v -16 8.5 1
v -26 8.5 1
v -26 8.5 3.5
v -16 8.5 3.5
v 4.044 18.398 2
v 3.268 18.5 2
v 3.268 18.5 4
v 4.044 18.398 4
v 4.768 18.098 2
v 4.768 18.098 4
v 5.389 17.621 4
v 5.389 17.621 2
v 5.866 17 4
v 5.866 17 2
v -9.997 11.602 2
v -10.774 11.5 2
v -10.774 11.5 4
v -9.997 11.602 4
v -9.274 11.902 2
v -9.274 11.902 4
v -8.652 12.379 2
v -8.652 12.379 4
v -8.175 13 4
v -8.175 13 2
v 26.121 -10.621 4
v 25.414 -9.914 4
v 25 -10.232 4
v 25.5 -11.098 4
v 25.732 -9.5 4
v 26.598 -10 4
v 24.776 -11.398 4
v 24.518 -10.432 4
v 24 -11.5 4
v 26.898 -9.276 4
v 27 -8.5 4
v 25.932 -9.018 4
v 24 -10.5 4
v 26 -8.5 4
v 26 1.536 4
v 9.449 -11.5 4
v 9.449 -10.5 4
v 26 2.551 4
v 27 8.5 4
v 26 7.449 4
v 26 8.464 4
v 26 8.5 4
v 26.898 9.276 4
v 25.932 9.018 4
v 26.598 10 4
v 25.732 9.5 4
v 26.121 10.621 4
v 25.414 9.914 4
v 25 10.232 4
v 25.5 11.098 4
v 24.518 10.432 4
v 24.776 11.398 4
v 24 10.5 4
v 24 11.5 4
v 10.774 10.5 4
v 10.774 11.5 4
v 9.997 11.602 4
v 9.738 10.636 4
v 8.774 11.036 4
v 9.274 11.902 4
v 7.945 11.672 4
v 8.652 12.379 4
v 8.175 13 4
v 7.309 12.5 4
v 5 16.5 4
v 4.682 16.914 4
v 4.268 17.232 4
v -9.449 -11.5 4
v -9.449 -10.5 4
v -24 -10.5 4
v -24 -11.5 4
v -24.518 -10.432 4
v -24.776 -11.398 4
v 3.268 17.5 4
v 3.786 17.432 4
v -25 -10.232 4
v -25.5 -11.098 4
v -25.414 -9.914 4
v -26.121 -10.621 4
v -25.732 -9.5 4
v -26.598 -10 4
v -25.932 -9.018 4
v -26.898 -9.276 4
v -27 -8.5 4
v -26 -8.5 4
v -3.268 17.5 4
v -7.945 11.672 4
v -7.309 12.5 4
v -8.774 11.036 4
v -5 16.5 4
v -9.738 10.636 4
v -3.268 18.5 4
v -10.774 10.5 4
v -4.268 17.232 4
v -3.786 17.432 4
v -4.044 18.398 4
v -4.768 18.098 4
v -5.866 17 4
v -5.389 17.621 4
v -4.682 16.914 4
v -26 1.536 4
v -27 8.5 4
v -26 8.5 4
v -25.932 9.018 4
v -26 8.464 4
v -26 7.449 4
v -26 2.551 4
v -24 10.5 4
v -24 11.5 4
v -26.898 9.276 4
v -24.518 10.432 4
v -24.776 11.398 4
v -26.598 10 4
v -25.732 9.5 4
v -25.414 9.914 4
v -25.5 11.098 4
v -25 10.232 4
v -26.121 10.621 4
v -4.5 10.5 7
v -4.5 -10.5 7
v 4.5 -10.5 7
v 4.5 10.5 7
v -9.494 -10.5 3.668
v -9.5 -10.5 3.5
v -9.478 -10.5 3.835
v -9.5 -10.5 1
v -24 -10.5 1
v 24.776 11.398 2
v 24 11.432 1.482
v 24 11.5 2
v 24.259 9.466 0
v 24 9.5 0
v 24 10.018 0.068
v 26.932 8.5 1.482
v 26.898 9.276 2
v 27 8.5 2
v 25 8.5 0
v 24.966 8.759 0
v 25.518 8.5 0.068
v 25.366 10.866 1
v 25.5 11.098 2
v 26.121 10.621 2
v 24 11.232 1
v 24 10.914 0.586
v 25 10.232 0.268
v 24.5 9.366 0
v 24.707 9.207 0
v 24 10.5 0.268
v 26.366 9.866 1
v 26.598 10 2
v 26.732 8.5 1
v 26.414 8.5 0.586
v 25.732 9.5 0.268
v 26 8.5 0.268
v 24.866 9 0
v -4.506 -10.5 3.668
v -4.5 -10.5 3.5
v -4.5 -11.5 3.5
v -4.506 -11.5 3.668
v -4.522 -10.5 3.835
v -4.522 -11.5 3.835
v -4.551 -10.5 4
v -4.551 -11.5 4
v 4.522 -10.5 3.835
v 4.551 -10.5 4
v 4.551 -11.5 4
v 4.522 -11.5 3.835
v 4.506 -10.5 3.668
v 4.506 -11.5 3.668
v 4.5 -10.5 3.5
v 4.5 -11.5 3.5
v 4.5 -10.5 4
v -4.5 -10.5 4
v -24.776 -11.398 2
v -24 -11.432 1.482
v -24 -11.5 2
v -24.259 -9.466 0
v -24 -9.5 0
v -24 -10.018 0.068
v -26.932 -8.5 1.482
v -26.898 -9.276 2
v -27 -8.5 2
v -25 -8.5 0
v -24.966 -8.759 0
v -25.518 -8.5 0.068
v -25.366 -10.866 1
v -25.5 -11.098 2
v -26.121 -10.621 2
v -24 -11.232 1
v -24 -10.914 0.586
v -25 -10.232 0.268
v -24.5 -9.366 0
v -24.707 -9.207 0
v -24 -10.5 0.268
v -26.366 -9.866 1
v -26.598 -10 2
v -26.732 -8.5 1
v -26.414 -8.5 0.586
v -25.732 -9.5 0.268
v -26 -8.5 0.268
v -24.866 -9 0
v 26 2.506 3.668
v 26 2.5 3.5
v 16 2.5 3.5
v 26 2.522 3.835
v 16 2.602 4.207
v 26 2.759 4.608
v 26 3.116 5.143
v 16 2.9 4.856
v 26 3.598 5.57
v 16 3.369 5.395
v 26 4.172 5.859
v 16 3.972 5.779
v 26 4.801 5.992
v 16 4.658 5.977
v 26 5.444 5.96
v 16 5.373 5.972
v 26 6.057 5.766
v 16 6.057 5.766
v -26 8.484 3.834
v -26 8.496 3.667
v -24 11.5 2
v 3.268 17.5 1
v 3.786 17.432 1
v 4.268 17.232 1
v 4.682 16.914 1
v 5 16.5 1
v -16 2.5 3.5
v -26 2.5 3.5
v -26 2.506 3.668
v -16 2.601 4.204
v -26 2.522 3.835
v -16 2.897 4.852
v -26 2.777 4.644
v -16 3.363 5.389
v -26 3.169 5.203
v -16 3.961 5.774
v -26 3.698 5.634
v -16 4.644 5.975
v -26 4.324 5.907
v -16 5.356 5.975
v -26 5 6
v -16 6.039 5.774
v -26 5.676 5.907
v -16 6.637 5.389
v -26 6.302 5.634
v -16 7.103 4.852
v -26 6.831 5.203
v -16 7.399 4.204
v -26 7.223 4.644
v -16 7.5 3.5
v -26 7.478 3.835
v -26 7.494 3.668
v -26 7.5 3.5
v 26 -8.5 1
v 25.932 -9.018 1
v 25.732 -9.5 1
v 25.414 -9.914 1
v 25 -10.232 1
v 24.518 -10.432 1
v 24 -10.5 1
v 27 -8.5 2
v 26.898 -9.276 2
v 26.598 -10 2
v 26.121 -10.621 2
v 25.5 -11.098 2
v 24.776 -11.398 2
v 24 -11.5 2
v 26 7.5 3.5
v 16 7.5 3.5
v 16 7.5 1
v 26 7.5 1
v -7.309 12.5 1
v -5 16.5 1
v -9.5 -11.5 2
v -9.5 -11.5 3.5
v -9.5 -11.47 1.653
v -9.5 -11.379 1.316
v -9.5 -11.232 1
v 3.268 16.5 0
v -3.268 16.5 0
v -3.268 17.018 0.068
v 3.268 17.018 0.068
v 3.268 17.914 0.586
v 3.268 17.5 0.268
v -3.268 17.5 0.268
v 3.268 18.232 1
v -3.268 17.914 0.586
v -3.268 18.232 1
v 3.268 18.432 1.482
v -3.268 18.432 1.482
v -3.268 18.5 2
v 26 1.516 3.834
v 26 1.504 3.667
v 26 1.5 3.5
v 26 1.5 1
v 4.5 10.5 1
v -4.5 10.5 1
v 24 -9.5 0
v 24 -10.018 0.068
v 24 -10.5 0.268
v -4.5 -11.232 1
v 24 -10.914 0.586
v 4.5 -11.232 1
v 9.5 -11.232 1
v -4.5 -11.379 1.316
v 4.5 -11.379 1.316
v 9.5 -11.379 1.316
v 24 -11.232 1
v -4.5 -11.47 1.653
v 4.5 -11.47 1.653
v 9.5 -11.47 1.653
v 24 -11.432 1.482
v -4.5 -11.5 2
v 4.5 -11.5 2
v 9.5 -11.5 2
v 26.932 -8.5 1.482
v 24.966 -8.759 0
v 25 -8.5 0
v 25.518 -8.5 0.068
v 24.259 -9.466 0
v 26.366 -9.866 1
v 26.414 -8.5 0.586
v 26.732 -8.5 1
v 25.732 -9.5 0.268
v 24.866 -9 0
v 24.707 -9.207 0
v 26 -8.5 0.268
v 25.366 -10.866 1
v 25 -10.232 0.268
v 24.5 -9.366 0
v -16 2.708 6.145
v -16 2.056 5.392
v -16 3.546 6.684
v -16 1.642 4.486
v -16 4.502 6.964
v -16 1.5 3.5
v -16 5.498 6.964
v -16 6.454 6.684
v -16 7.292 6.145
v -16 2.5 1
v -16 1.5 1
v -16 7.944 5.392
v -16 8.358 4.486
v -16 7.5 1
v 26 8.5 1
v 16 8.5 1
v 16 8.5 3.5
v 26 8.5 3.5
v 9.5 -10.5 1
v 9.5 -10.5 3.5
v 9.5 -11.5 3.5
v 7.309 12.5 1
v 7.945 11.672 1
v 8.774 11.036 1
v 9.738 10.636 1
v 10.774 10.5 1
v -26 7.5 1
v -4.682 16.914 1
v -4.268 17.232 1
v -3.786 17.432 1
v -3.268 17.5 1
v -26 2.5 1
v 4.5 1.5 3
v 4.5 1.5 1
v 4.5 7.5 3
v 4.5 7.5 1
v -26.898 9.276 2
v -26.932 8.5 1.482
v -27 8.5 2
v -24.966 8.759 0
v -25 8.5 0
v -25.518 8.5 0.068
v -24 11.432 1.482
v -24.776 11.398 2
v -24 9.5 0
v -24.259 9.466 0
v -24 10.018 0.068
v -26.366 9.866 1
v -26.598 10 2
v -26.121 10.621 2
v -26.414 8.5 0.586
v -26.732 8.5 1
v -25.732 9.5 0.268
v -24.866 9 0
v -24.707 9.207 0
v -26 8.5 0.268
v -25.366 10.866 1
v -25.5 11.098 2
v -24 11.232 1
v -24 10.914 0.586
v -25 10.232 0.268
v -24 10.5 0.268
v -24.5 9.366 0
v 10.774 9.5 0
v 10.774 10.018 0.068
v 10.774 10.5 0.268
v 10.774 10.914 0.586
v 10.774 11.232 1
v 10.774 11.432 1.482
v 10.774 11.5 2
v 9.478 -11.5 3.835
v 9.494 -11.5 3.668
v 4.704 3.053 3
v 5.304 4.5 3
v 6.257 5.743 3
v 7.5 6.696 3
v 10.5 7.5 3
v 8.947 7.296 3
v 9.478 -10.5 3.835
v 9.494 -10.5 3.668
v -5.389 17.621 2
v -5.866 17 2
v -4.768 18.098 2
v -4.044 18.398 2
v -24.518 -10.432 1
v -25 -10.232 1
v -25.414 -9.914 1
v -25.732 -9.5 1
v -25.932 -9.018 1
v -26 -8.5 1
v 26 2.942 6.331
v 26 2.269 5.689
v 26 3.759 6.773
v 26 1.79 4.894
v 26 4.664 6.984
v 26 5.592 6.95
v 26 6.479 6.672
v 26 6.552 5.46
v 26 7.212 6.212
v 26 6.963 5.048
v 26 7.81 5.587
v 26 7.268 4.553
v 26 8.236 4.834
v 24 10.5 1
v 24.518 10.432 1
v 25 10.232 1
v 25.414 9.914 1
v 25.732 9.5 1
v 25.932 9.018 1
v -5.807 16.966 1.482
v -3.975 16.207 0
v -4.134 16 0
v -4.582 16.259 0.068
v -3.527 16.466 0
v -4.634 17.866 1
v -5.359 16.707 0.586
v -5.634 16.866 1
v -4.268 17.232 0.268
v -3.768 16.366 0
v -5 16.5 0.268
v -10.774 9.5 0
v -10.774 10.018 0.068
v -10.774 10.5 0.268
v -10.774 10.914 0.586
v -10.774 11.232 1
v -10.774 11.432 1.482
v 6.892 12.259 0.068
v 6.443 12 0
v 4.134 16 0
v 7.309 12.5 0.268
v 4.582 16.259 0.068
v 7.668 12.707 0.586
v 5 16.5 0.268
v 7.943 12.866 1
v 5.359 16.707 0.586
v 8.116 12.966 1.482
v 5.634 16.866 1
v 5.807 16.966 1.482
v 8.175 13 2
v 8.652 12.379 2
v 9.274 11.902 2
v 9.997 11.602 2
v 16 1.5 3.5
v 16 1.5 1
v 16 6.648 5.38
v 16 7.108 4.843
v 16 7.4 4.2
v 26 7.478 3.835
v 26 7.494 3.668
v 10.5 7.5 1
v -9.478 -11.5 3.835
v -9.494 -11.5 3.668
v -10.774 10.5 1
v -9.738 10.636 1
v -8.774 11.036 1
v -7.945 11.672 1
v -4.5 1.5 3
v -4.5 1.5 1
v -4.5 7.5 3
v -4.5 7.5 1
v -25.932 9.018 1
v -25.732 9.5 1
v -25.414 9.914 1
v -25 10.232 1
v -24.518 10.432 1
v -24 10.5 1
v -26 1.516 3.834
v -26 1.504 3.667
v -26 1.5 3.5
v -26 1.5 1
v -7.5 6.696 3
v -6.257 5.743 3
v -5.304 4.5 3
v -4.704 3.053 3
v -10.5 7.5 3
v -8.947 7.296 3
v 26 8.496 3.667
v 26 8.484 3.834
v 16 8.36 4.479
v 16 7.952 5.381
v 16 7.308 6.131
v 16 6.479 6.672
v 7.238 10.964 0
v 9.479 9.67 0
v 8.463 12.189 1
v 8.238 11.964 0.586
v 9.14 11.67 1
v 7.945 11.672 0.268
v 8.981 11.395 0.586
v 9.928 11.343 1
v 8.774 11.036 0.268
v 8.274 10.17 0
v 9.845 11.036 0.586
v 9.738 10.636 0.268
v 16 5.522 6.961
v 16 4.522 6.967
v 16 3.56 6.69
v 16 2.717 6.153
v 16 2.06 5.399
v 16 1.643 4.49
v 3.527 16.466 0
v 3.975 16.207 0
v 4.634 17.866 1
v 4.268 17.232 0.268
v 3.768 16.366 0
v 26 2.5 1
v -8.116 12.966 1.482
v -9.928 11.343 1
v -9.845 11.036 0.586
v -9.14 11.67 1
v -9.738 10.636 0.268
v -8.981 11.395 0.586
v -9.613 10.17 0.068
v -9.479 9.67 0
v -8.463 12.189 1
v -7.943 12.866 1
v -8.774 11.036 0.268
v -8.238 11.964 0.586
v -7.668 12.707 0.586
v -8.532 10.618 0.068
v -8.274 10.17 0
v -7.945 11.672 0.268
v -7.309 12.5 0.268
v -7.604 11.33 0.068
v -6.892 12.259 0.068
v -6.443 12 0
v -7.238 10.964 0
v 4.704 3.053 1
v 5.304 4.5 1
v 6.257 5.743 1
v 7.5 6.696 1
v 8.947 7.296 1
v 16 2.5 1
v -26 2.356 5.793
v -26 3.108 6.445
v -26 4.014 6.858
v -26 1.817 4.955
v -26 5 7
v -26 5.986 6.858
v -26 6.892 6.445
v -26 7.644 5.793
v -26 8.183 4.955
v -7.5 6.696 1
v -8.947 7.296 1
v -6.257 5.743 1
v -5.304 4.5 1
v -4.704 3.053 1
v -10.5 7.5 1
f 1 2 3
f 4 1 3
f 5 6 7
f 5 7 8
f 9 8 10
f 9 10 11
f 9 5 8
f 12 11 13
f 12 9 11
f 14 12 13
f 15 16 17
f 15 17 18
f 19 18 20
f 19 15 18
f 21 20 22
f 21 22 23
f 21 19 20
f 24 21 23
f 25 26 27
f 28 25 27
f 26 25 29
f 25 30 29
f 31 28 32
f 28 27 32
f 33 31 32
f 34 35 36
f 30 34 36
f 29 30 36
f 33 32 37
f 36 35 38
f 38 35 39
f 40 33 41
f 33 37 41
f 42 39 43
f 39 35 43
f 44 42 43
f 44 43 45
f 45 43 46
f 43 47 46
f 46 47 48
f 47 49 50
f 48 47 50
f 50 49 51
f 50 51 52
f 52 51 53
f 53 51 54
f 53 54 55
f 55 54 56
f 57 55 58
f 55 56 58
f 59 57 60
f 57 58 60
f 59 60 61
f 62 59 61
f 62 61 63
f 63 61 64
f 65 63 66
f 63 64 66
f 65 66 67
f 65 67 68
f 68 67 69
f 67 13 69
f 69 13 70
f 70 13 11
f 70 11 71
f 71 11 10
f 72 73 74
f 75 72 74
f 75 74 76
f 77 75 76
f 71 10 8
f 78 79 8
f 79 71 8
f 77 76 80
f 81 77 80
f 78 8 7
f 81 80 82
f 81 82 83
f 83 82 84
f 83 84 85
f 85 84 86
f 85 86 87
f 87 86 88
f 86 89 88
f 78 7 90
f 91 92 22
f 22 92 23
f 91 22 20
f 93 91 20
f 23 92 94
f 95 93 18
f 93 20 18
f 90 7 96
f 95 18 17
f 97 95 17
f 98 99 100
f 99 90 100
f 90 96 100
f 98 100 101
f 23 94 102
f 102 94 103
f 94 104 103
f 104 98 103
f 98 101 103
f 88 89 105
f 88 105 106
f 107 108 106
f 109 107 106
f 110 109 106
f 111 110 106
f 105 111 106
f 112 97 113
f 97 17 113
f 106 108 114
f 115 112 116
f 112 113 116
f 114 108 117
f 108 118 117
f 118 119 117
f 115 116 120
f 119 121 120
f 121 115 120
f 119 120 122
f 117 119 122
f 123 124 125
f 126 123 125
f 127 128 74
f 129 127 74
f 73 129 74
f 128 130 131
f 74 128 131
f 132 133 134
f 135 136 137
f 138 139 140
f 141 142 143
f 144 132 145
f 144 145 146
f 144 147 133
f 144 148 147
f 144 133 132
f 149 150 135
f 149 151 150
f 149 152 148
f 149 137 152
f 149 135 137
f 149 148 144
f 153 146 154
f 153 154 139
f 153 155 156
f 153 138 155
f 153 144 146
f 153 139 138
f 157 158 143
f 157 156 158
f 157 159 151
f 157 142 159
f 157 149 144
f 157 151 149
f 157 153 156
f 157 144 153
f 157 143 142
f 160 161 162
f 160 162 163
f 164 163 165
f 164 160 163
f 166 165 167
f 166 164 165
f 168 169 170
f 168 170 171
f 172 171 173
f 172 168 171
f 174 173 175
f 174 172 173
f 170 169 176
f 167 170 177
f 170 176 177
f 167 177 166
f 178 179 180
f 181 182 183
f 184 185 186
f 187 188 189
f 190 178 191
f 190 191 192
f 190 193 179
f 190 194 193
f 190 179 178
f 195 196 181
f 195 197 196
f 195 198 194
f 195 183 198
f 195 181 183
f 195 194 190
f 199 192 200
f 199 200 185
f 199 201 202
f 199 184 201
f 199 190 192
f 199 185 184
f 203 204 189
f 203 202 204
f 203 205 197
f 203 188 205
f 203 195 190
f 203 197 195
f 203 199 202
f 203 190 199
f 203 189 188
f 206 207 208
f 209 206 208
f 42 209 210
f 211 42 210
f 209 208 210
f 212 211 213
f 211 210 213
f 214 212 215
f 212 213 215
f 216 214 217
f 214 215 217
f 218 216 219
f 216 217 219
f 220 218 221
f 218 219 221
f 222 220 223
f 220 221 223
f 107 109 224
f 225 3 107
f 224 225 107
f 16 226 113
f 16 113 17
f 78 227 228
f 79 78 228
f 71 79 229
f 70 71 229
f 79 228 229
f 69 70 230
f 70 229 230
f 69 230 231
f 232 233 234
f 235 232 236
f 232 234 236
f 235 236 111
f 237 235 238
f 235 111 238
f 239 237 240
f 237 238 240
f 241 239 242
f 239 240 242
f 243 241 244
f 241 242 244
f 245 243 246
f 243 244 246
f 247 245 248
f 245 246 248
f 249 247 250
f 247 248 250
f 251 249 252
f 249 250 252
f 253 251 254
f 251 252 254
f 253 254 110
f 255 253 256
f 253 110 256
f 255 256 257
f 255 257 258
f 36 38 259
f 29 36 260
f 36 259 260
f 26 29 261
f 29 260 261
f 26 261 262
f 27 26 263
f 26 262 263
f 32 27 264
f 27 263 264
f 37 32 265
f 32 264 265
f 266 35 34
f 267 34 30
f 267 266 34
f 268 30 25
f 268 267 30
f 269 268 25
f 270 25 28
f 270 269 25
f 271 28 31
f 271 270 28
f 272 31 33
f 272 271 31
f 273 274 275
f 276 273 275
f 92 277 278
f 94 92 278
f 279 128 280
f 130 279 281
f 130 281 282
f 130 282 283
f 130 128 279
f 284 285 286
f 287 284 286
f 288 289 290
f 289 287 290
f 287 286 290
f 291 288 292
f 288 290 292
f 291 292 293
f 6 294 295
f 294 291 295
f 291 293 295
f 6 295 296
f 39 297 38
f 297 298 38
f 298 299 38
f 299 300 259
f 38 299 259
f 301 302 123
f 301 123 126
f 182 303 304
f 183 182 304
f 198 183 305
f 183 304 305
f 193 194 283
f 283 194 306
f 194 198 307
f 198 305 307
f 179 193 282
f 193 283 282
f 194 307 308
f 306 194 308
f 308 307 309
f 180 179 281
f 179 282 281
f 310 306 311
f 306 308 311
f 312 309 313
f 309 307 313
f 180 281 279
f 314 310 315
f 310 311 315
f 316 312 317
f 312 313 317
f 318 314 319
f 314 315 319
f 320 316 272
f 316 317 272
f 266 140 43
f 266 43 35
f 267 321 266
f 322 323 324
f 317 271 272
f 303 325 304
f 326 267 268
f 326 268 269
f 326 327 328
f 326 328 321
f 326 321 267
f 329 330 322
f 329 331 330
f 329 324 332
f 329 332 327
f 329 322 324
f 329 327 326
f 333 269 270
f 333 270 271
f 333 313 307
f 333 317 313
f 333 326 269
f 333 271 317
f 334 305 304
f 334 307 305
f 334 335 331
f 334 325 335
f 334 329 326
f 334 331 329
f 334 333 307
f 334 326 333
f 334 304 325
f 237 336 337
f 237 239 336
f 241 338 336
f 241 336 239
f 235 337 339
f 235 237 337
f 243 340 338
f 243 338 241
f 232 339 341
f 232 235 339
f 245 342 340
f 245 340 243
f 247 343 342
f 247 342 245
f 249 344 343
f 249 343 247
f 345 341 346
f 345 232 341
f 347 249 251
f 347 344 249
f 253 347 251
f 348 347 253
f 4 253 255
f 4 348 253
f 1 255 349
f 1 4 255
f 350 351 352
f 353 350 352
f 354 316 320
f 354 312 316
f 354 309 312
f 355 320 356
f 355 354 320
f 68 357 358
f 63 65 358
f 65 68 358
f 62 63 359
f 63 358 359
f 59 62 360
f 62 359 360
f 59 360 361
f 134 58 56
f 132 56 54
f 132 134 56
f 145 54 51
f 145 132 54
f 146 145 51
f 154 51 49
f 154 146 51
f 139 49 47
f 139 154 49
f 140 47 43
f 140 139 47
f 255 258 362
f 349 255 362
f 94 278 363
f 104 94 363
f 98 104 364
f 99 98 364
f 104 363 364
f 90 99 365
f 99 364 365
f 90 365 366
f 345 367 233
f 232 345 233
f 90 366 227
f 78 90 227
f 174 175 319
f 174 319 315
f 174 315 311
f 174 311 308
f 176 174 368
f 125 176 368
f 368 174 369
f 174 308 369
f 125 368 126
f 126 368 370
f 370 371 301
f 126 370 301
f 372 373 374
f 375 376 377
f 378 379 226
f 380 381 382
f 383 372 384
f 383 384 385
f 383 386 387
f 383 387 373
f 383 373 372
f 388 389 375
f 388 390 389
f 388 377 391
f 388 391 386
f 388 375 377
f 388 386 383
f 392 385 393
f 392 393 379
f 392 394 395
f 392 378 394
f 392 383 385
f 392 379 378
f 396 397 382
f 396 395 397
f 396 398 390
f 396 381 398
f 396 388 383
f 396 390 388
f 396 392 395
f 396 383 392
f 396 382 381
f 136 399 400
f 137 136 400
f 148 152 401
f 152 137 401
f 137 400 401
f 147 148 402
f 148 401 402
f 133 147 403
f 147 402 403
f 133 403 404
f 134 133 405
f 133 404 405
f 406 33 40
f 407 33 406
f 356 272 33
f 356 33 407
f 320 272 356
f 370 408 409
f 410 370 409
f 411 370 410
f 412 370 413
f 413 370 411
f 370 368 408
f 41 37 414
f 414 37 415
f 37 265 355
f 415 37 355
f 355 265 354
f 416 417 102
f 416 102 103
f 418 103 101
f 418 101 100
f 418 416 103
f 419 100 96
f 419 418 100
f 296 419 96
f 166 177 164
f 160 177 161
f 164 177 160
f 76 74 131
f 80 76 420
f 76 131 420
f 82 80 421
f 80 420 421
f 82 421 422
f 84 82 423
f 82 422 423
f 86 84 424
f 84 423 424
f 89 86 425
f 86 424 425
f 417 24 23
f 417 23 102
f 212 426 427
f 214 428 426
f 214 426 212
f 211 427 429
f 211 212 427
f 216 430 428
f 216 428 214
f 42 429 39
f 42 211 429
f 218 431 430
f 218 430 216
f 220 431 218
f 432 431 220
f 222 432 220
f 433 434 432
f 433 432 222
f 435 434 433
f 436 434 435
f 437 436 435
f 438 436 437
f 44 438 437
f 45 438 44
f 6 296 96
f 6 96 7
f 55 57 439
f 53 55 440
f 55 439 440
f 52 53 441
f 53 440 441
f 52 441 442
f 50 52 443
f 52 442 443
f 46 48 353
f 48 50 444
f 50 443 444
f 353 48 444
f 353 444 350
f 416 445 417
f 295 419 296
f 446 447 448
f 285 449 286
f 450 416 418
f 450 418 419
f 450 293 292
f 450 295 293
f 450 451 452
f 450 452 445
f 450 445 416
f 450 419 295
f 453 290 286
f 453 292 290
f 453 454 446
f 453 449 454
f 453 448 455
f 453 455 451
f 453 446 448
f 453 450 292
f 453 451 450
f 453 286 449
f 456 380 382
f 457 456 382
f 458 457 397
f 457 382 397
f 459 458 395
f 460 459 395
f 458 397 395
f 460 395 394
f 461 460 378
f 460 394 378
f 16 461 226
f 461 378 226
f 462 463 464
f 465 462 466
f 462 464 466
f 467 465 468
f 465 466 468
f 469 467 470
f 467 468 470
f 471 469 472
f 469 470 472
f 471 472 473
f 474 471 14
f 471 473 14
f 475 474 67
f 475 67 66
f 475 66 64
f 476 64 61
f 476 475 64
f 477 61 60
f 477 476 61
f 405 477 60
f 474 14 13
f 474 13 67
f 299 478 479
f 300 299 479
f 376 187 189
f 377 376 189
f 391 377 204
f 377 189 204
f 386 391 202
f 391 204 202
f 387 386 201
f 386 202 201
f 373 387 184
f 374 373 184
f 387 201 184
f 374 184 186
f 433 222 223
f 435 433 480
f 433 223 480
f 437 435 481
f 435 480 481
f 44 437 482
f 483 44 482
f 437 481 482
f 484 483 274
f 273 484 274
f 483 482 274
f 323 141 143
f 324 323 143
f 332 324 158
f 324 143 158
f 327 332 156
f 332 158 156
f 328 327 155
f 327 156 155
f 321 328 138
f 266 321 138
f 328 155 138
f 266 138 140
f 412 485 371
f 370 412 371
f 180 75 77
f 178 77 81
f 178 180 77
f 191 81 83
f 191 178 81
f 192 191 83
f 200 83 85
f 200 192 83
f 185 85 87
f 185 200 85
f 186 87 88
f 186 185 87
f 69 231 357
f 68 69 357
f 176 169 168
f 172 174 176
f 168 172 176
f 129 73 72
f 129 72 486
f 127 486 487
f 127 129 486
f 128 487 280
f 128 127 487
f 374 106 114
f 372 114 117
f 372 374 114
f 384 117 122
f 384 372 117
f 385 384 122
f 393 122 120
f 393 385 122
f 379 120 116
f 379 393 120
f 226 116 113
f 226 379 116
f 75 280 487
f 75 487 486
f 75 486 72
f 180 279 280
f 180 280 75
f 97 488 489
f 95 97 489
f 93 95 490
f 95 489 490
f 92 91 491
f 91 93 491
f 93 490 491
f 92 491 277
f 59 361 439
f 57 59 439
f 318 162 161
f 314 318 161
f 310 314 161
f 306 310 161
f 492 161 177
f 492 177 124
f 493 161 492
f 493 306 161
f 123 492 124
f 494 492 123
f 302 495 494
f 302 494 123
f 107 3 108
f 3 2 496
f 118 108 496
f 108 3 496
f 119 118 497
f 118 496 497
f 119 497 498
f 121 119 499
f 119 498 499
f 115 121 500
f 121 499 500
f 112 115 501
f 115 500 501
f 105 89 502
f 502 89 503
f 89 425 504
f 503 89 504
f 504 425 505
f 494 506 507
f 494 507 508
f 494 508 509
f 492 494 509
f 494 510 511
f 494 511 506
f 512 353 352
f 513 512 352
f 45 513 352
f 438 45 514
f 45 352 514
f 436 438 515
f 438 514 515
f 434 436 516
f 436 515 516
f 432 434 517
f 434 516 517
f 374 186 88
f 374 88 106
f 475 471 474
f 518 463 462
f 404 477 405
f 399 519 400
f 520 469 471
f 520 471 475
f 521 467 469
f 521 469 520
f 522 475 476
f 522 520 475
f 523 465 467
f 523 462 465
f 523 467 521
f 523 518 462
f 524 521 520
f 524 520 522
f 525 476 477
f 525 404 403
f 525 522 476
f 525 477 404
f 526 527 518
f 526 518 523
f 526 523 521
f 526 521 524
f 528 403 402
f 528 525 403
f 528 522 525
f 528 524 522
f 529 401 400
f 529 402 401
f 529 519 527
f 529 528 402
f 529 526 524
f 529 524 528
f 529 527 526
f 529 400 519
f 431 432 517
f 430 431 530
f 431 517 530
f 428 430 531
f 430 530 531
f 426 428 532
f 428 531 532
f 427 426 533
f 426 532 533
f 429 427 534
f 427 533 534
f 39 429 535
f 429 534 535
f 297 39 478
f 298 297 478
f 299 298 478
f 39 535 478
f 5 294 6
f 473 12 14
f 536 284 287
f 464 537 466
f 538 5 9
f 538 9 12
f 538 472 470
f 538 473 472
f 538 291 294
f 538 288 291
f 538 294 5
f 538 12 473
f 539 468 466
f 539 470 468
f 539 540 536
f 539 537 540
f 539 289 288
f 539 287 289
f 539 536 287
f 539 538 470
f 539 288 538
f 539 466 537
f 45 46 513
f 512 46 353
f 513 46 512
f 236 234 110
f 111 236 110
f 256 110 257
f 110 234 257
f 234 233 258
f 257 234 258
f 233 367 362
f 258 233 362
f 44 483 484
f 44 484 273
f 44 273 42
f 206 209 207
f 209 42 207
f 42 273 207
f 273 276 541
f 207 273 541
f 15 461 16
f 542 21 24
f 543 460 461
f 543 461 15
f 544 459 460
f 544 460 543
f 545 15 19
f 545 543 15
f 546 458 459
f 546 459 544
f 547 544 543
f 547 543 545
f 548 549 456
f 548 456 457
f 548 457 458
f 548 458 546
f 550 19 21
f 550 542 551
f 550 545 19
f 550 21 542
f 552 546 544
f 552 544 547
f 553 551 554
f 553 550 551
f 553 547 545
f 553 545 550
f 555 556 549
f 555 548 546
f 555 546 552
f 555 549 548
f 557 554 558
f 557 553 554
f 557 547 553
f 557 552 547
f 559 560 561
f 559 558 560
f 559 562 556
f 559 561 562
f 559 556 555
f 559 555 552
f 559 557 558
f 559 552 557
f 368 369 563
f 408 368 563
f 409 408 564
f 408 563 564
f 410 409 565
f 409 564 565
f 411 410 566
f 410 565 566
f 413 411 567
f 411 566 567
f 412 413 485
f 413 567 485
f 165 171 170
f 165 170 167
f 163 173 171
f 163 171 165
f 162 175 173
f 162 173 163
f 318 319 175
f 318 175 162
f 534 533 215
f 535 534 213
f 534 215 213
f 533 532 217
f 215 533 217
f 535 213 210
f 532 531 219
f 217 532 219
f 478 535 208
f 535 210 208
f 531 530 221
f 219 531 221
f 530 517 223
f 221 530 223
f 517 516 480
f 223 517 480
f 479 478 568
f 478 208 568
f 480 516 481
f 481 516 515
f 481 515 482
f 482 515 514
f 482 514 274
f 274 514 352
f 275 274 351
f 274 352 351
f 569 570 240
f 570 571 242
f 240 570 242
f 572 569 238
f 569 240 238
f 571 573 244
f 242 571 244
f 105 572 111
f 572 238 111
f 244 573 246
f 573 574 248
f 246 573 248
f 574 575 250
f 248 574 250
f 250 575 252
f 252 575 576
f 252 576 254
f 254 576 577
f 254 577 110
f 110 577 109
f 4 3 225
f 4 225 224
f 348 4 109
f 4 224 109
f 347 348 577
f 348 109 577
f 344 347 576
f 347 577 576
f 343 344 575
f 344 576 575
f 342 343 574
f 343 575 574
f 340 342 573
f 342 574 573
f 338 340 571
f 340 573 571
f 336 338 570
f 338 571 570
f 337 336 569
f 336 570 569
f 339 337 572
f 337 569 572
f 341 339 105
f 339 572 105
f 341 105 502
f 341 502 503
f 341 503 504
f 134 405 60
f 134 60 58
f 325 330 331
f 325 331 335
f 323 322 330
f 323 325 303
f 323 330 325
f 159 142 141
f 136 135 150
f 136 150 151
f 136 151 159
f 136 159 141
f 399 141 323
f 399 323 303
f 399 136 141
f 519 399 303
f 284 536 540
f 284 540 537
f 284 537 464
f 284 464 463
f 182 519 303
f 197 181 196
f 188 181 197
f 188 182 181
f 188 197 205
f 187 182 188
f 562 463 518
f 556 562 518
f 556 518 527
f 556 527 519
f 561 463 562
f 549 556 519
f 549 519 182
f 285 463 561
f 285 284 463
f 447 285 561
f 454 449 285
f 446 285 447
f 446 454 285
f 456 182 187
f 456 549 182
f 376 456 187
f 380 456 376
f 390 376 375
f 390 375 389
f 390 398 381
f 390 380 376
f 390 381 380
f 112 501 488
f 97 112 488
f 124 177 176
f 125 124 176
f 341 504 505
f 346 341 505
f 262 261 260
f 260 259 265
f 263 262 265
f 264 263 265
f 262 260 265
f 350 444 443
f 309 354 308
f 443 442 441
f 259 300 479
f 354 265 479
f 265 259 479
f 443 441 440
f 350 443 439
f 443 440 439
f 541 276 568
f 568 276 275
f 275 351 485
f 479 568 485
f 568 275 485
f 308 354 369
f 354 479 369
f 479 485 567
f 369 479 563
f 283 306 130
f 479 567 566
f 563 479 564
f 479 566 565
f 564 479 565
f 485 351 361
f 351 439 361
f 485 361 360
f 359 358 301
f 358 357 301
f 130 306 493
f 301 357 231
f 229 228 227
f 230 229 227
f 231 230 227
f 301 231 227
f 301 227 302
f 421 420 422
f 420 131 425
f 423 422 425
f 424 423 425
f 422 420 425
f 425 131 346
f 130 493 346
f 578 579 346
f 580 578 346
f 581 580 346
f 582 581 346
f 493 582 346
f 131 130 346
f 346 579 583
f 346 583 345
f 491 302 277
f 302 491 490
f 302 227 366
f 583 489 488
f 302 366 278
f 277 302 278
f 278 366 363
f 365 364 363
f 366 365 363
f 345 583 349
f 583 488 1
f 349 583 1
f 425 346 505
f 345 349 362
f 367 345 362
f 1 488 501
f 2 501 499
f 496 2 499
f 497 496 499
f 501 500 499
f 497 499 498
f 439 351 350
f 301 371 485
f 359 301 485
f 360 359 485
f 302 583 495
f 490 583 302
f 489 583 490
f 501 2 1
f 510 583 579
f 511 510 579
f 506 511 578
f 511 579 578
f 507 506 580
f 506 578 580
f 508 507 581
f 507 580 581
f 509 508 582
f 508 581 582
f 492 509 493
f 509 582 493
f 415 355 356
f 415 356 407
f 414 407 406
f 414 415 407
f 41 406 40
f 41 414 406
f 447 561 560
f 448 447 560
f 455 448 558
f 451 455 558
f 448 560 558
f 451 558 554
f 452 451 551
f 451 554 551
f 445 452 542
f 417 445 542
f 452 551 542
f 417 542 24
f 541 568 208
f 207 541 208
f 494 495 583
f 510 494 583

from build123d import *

# Parameters (mm, degrees)
BOSS_EXTRUDE1_DEPTH = 4
SHELL1_T            = -1
BOSS_EXTRUDE2_START = -26
BOSS_EXTRUDE2_DEPTH = 10
BOSS_EXTRUDE3_START = 16
BOSS_EXTRUDE3_DEPTH = 10
BOSS_EXTRUDE5_DEPTH = 2
SKETCH4_3_W         = 9
SKETCH4_3_H         = 21
BOSS_EXTRUDE6_DEPTH = 6
CUT_EXTRUDE1_REACH  = 35.47
FILLET1_R           = 2


with BuildPart() as part:
    # Sketch2 → Boss-Extrude1 (new body)
    with BuildSketch(Plane.XY):
        with BuildLine():
            Line((-3.267949192, 18.5), (3.267949192, 18.5))
            ThreePointArc((3.267949192, 18.5), (4.767949192, 18.098076211), (5.866025404, 17))
            Line((5.866025404, 17), (8.175426481, 13))
            ThreePointArc((8.175426481, 13), (9.273502692, 11.901923789), (10.773502692, 11.5))
            Line((10.773502692, 11.5), (24, 11.5))
            ThreePointArc((24, 11.5), (26.121320344, 10.621320344), (27, 8.5))
            Line((27, 8.5), (27, -8.5))
            ThreePointArc((27, -8.5), (26.121320344, -10.621320344), (24, -11.5))
            Line((24, -11.5), (-24, -11.5))
            ThreePointArc((-24, -11.5), (-26.121320344, -10.621320344), (-27, -8.5))
            Line((-27, -8.5), (-27, 8.5))
            ThreePointArc((-27, 8.5), (-26.121320344, 10.621320344), (-24, 11.5))
            Line((-24, 11.5), (-10.773502692, 11.5))
            ThreePointArc((-10.773502692, 11.5), (-9.273502692, 11.901923789), (-8.175426481, 13))
            Line((-8.175426481, 13), (-5.866025404, 17))
            ThreePointArc((-5.866025404, 17), (-4.767949192, 18.098076211), (-3.267949192, 18.5))
        make_face()
    extrude(amount=BOSS_EXTRUDE1_DEPTH)

    # Shell1
    shell1_openings = [part.faces().sort_by_distance(p)[0] for p in [
        (0, 1.077008716, 4),
    ]]
    offset(amount=SHELL1_T, openings=shell1_openings, kind=Kind.INTERSECTION)

    # Sketch3 → Boss-Extrude2 (add)
    with BuildSketch(Plane(origin=(0, 0, 0), x_dir=(0, 0, -1), z_dir=(1, 0, 0)).offset(BOSS_EXTRUDE2_START)):
        with BuildLine():
            Line((-1, 2.5), (-3.5, 2.5))
            ThreePointArc((-3.5, 2.5), (-6, 5), (-3.5, 7.5))
            Line((-3.5, 7.5), (-1, 7.5))
            Line((-1, 7.5), (-1, 8.5))
            Line((-1, 8.5), (-3.5, 8.5))
            ThreePointArc((-3.5, 8.5), (-7, 5), (-3.5, 1.5))
            Line((-3.5, 1.5), (-1, 1.5))
            Line((-1, 1.5), (-1, 2.5))
        make_face()
    extrude(amount=BOSS_EXTRUDE2_DEPTH)

    # Sketch3<3> → Boss-Extrude3 (add)
    with BuildSketch(Plane(origin=(0, 0, 0), x_dir=(0, 0, -1), z_dir=(1, 0, 0)).offset(BOSS_EXTRUDE3_START)):
        with BuildLine():
            Line((-6.672077255, 6.479163916), (-5.765769468, 6.056545654))
            ThreePointArc((-5.765769468, 6.056545654), (-4.843249021, 7.108478615), (-3.5, 7.5))
            Line((-3.5, 7.5), (-1, 7.5))
            Line((-1, 7.5), (-1, 8.5))
            Line((-1, 8.5), (-3.5, 8.5))
            ThreePointArc((-3.5, 8.5), (-5.380548629, 7.95187006), (-6.672077255, 6.479163916))
        make_face()
        with BuildLine():
            Line((-1, 2.5), (-3.5, 2.5))
            ThreePointArc((-3.5, 2.5), (-5.608478615, 3.656750979), (-5.765769468, 6.056545654))
            Line((-5.765769468, 6.056545654), (-6.672077255, 6.479163916))
            ThreePointArc((-6.672077255, 6.479163916), (-6.45187006, 3.119451371), (-3.5, 1.5))
            Line((-3.5, 1.5), (-1, 1.5))
            Line((-1, 1.5), (-1, 2.5))
        make_face()
    extrude(amount=BOSS_EXTRUDE3_DEPTH)

    # Sketch4 → Boss-Extrude5 (add)
    with BuildSketch(Plane.XY.offset(1)):
        with BuildLine():
            Line((-4.5, 1.5), (-4.5, 7.5))
            Line((-4.5, 7.5), (-10.5, 7.5))
            ThreePointArc((-10.5, 7.5), (-6.257359313, 5.742640687), (-4.5, 1.5))
        make_face()
        with BuildLine():
            Line((10.5, 7.5), (4.5, 7.5))
            Line((4.5, 7.5), (4.5, 1.5))
            ThreePointArc((4.5, 1.5), (6.257359313, 5.742640687), (10.5, 7.5))
        make_face()
    extrude(amount=BOSS_EXTRUDE5_DEPTH)

    # Sketch4<3> → Boss-Extrude6 (add)
    with BuildSketch(Plane.XY.offset(1)):
        Rectangle(SKETCH4_3_W, SKETCH4_3_H)
    extrude(amount=BOSS_EXTRUDE6_DEPTH)

    # Sketch5 → Cut-Extrude1 (cut, up to next)
    with BuildSketch(Plane(origin=(0, 0, 0), x_dir=(1, 0, 0), z_dir=(0, 1, 0)), mode=Mode.PRIVATE) as cut_extrude1_sk1:
        with BuildLine():
            Line((-9.5, -3.5), (-9.5, -1))
            Line((-9.5, -1), (-4.5, -1))
            Line((-4.5, -1), (-4.5, -3.5))
            ThreePointArc((-4.5, -3.5), (-7, -6), (-9.5, -3.5))
        make_face()
    cut_extrude1_tool1 = extrude(cut_extrude1_sk1.sketch, amount=-CUT_EXTRUDE1_REACH, mode=Mode.PRIVATE) & part.part
    # Sketch5 → Cut-Extrude1 (cut, up to next)
    with BuildSketch(Plane(origin=(0, 0, 0), x_dir=(1, 0, 0), z_dir=(0, 1, 0)), mode=Mode.PRIVATE) as cut_extrude1_sk2:
        with BuildLine():
            Line((4.5, -3.5), (4.5, -1))
            Line((4.5, -1), (9.5, -1))
            Line((9.5, -1), (9.5, -3.5))
            ThreePointArc((9.5, -3.5), (7, -6), (4.5, -3.5))
        make_face()
    cut_extrude1_tool2 = extrude(cut_extrude1_sk2.sketch, amount=-CUT_EXTRUDE1_REACH, mode=Mode.PRIVATE) & part.part
    add(cut_extrude1_tool1.solids().sort_by_distance((-7, 0, 3.266625))[0], mode=Mode.SUBTRACT)
    add(cut_extrude1_tool2.solids().sort_by_distance((7, 0, 3.266625))[0], mode=Mode.SUBTRACT)

    # Fillet1
    # the kernel refuses this fillet: 2 mm, written as the material it takes off along each edge
    with BuildSketch(Plane(origin=(27, 8.5, 0), x_dir=(0, 0, 1), z_dir=(0, -1, 0)), Plane(origin=(-27, -8.5, 0), x_dir=(0, 0, 1), z_dir=(0, 1, 0))) as fillet1_piece_1:
        with BuildLine():
            CenterArc((FILLET1_R, FILLET1_R), FILLET1_R, 180, 90)
            Line((0, FILLET1_R), (0, 0))
            Line((0, 0), (FILLET1_R, 0))
        make_face()
    extrude(amount=17, mode=Mode.SUBTRACT)
    with BuildSketch(Plane(origin=(24, 8.5, 0), x_dir=(0, 1, 0), z_dir=(-1, 0, 0))) as fillet1_piece_2:
        with BuildLine():
            CenterArc((3 - FILLET1_R, -FILLET1_R), FILLET1_R, 0, 90)
            Line((3 - FILLET1_R, 0), (3, 0))
            Line((3, 0), (3, -FILLET1_R))
        make_face()
    revolve(axis=Axis((24, 8.5, 0), (0, 0, -1)), revolution_arc=90, mode=Mode.SUBTRACT)
    with BuildSketch(Plane(origin=(10.773502692, 11.5, 0), x_dir=(0, 0, 1), z_dir=(1, 0, 0)), Plane(origin=(-24, 11.5, 0), x_dir=(0, 0, 1), z_dir=(1, 0, 0))) as fillet1_piece_3:
        with BuildLine():
            CenterArc((FILLET1_R, FILLET1_R), FILLET1_R, 180, 90)
            Line((0, FILLET1_R), (0, 0))
            Line((0, 0), (FILLET1_R, 0))
        make_face()
    extrude(amount=13.226497308, mode=Mode.SUBTRACT)
    with BuildSketch(Plane(origin=(10.773502692, 14.5, 0), x_dir=(-0.8660254037844389, -0.49999999999999956, 0), z_dir=(-0.49999999999999956, 0.8660254037844389, 0))) as fillet1_piece_4:
        with BuildLine():
            CenterArc((3 + FILLET1_R, FILLET1_R), FILLET1_R, 180, 90)
            Line((3 + FILLET1_R, 0), (3, 0))
            Line((3, 0), (3, FILLET1_R))
        make_face()
    revolve(axis=Axis((10.773502692, 14.5, 0), (0, 0, 1)), revolution_arc=60, mode=Mode.SUBTRACT)
    with BuildSketch(Plane(origin=(5.866025404, 17, 0), x_dir=(0, 0, 1), z_dir=(0.500000000000004, -0.8660254037844364, 0)), Plane(origin=(-8.175426481, 13, 0), x_dir=(0, 0, 1), z_dir=(0.5000000000000043, 0.8660254037844362, 0))) as fillet1_piece_5:
        with BuildLine():
            CenterArc((FILLET1_R, FILLET1_R), FILLET1_R, 180, 90)
            Line((0, FILLET1_R), (0, 0))
            Line((0, 0), (FILLET1_R, 0))
        make_face()
    extrude(amount=4.618802154, mode=Mode.SUBTRACT)
    with BuildSketch(Plane(origin=(3.267949192, 15.5, 0), x_dir=(0, 1, 0), z_dir=(-1, 0, 0))) as fillet1_piece_6:
        with BuildLine():
            CenterArc((3 - FILLET1_R, -FILLET1_R), FILLET1_R, 0, 90)
            Line((3 - FILLET1_R, 0), (3, 0))
            Line((3, 0), (3, -FILLET1_R))
        make_face()
    revolve(axis=Axis((3.267949192, 15.5, 0), (0, 0, -1)), revolution_arc=60, mode=Mode.SUBTRACT)
    with BuildSketch(Plane(origin=(-3.267949192, 18.5, 0), x_dir=(0, 0, 1), z_dir=(1, 0, 0))) as fillet1_piece_7:
        with BuildLine():
            CenterArc((FILLET1_R, FILLET1_R), FILLET1_R, 180, 90)
            Line((0, FILLET1_R), (0, 0))
            Line((0, 0), (FILLET1_R, 0))
        make_face()
    extrude(amount=6.535898385, mode=Mode.SUBTRACT)
    with BuildSketch(Plane(origin=(-3.267949192, 15.5, 0), x_dir=(-0.8660254037844407, 0.4999999999999964, 0), z_dir=(-0.4999999999999964, -0.8660254037844407, 0))) as fillet1_piece_8:
        with BuildLine():
            CenterArc((3 - FILLET1_R, -FILLET1_R), FILLET1_R, 0, 90)
            Line((3 - FILLET1_R, 0), (3, 0))
            Line((3, 0), (3, -FILLET1_R))
        make_face()
    revolve(axis=Axis((-3.267949192, 15.5, 0), (0, 0, -1)), revolution_arc=60, mode=Mode.SUBTRACT)
    with BuildSketch(Plane(origin=(-10.773502692, 14.5, 0), x_dir=(0, -1, 0), z_dir=(-1, 0, 0))) as fillet1_piece_9:
        with BuildLine():
            CenterArc((3 + FILLET1_R, FILLET1_R), FILLET1_R, 180, 90)
            Line((3, FILLET1_R), (3, 0))
            Line((3, 0), (3 + FILLET1_R, 0))
        make_face()
    revolve(axis=Axis((-10.773502692, 14.5, 0), (0, 0, 1)), revolution_arc=60, mode=Mode.SUBTRACT)
    with BuildSketch(Plane(origin=(-24, 8.5, 0), x_dir=(-1, 0, 0), z_dir=(0, -1, 0))) as fillet1_piece_10:
        with BuildLine():
            CenterArc((3 - FILLET1_R, -FILLET1_R), FILLET1_R, 0, 90)
            Line((3, -FILLET1_R), (3, 0))
            Line((3, 0), (3 - FILLET1_R, 0))
        make_face()
    revolve(axis=Axis((-24, 8.5, 0), (0, 0, -1)), revolution_arc=90, mode=Mode.SUBTRACT)
    with BuildSketch(Plane(origin=(-24, -8.5, 0), x_dir=(0, -1, 0), z_dir=(1, 0, 0))) as fillet1_piece_11:
        with BuildLine():
            CenterArc((3 - FILLET1_R, -FILLET1_R), FILLET1_R, 0, 90)
            Line((3 - FILLET1_R, 0), (3, 0))
            Line((3, 0), (3, -FILLET1_R))
        make_face()
    revolve(axis=Axis((-24, -8.5, 0), (0, 0, -1)), revolution_arc=90, mode=Mode.SUBTRACT)
    with BuildSketch(Plane(origin=(24, -11.5, 0), x_dir=(0, 0, 1), z_dir=(-1, 0, 0))) as fillet1_piece_12:
        with BuildLine():
            CenterArc((FILLET1_R, FILLET1_R), FILLET1_R, 180, 90)
            Line((0, FILLET1_R), (0, 0))
            Line((0, 0), (FILLET1_R, 0))
        make_face()
    extrude(amount=48, mode=Mode.SUBTRACT)
    with BuildSketch(Plane(origin=(24, -8.5, 0), x_dir=(1, 0, 0), z_dir=(0, 1, 0))) as fillet1_piece_13:
        with BuildLine():
            CenterArc((3 - FILLET1_R, -FILLET1_R), FILLET1_R, 0, 90)
            Line((3 - FILLET1_R, 0), (3, 0))
            Line((3, 0), (3, -FILLET1_R))
        make_face()
    revolve(axis=Axis((24, -8.5, 0), (0, 0, -1)), revolution_arc=90, mode=Mode.SUBTRACT)


solid = part.part
